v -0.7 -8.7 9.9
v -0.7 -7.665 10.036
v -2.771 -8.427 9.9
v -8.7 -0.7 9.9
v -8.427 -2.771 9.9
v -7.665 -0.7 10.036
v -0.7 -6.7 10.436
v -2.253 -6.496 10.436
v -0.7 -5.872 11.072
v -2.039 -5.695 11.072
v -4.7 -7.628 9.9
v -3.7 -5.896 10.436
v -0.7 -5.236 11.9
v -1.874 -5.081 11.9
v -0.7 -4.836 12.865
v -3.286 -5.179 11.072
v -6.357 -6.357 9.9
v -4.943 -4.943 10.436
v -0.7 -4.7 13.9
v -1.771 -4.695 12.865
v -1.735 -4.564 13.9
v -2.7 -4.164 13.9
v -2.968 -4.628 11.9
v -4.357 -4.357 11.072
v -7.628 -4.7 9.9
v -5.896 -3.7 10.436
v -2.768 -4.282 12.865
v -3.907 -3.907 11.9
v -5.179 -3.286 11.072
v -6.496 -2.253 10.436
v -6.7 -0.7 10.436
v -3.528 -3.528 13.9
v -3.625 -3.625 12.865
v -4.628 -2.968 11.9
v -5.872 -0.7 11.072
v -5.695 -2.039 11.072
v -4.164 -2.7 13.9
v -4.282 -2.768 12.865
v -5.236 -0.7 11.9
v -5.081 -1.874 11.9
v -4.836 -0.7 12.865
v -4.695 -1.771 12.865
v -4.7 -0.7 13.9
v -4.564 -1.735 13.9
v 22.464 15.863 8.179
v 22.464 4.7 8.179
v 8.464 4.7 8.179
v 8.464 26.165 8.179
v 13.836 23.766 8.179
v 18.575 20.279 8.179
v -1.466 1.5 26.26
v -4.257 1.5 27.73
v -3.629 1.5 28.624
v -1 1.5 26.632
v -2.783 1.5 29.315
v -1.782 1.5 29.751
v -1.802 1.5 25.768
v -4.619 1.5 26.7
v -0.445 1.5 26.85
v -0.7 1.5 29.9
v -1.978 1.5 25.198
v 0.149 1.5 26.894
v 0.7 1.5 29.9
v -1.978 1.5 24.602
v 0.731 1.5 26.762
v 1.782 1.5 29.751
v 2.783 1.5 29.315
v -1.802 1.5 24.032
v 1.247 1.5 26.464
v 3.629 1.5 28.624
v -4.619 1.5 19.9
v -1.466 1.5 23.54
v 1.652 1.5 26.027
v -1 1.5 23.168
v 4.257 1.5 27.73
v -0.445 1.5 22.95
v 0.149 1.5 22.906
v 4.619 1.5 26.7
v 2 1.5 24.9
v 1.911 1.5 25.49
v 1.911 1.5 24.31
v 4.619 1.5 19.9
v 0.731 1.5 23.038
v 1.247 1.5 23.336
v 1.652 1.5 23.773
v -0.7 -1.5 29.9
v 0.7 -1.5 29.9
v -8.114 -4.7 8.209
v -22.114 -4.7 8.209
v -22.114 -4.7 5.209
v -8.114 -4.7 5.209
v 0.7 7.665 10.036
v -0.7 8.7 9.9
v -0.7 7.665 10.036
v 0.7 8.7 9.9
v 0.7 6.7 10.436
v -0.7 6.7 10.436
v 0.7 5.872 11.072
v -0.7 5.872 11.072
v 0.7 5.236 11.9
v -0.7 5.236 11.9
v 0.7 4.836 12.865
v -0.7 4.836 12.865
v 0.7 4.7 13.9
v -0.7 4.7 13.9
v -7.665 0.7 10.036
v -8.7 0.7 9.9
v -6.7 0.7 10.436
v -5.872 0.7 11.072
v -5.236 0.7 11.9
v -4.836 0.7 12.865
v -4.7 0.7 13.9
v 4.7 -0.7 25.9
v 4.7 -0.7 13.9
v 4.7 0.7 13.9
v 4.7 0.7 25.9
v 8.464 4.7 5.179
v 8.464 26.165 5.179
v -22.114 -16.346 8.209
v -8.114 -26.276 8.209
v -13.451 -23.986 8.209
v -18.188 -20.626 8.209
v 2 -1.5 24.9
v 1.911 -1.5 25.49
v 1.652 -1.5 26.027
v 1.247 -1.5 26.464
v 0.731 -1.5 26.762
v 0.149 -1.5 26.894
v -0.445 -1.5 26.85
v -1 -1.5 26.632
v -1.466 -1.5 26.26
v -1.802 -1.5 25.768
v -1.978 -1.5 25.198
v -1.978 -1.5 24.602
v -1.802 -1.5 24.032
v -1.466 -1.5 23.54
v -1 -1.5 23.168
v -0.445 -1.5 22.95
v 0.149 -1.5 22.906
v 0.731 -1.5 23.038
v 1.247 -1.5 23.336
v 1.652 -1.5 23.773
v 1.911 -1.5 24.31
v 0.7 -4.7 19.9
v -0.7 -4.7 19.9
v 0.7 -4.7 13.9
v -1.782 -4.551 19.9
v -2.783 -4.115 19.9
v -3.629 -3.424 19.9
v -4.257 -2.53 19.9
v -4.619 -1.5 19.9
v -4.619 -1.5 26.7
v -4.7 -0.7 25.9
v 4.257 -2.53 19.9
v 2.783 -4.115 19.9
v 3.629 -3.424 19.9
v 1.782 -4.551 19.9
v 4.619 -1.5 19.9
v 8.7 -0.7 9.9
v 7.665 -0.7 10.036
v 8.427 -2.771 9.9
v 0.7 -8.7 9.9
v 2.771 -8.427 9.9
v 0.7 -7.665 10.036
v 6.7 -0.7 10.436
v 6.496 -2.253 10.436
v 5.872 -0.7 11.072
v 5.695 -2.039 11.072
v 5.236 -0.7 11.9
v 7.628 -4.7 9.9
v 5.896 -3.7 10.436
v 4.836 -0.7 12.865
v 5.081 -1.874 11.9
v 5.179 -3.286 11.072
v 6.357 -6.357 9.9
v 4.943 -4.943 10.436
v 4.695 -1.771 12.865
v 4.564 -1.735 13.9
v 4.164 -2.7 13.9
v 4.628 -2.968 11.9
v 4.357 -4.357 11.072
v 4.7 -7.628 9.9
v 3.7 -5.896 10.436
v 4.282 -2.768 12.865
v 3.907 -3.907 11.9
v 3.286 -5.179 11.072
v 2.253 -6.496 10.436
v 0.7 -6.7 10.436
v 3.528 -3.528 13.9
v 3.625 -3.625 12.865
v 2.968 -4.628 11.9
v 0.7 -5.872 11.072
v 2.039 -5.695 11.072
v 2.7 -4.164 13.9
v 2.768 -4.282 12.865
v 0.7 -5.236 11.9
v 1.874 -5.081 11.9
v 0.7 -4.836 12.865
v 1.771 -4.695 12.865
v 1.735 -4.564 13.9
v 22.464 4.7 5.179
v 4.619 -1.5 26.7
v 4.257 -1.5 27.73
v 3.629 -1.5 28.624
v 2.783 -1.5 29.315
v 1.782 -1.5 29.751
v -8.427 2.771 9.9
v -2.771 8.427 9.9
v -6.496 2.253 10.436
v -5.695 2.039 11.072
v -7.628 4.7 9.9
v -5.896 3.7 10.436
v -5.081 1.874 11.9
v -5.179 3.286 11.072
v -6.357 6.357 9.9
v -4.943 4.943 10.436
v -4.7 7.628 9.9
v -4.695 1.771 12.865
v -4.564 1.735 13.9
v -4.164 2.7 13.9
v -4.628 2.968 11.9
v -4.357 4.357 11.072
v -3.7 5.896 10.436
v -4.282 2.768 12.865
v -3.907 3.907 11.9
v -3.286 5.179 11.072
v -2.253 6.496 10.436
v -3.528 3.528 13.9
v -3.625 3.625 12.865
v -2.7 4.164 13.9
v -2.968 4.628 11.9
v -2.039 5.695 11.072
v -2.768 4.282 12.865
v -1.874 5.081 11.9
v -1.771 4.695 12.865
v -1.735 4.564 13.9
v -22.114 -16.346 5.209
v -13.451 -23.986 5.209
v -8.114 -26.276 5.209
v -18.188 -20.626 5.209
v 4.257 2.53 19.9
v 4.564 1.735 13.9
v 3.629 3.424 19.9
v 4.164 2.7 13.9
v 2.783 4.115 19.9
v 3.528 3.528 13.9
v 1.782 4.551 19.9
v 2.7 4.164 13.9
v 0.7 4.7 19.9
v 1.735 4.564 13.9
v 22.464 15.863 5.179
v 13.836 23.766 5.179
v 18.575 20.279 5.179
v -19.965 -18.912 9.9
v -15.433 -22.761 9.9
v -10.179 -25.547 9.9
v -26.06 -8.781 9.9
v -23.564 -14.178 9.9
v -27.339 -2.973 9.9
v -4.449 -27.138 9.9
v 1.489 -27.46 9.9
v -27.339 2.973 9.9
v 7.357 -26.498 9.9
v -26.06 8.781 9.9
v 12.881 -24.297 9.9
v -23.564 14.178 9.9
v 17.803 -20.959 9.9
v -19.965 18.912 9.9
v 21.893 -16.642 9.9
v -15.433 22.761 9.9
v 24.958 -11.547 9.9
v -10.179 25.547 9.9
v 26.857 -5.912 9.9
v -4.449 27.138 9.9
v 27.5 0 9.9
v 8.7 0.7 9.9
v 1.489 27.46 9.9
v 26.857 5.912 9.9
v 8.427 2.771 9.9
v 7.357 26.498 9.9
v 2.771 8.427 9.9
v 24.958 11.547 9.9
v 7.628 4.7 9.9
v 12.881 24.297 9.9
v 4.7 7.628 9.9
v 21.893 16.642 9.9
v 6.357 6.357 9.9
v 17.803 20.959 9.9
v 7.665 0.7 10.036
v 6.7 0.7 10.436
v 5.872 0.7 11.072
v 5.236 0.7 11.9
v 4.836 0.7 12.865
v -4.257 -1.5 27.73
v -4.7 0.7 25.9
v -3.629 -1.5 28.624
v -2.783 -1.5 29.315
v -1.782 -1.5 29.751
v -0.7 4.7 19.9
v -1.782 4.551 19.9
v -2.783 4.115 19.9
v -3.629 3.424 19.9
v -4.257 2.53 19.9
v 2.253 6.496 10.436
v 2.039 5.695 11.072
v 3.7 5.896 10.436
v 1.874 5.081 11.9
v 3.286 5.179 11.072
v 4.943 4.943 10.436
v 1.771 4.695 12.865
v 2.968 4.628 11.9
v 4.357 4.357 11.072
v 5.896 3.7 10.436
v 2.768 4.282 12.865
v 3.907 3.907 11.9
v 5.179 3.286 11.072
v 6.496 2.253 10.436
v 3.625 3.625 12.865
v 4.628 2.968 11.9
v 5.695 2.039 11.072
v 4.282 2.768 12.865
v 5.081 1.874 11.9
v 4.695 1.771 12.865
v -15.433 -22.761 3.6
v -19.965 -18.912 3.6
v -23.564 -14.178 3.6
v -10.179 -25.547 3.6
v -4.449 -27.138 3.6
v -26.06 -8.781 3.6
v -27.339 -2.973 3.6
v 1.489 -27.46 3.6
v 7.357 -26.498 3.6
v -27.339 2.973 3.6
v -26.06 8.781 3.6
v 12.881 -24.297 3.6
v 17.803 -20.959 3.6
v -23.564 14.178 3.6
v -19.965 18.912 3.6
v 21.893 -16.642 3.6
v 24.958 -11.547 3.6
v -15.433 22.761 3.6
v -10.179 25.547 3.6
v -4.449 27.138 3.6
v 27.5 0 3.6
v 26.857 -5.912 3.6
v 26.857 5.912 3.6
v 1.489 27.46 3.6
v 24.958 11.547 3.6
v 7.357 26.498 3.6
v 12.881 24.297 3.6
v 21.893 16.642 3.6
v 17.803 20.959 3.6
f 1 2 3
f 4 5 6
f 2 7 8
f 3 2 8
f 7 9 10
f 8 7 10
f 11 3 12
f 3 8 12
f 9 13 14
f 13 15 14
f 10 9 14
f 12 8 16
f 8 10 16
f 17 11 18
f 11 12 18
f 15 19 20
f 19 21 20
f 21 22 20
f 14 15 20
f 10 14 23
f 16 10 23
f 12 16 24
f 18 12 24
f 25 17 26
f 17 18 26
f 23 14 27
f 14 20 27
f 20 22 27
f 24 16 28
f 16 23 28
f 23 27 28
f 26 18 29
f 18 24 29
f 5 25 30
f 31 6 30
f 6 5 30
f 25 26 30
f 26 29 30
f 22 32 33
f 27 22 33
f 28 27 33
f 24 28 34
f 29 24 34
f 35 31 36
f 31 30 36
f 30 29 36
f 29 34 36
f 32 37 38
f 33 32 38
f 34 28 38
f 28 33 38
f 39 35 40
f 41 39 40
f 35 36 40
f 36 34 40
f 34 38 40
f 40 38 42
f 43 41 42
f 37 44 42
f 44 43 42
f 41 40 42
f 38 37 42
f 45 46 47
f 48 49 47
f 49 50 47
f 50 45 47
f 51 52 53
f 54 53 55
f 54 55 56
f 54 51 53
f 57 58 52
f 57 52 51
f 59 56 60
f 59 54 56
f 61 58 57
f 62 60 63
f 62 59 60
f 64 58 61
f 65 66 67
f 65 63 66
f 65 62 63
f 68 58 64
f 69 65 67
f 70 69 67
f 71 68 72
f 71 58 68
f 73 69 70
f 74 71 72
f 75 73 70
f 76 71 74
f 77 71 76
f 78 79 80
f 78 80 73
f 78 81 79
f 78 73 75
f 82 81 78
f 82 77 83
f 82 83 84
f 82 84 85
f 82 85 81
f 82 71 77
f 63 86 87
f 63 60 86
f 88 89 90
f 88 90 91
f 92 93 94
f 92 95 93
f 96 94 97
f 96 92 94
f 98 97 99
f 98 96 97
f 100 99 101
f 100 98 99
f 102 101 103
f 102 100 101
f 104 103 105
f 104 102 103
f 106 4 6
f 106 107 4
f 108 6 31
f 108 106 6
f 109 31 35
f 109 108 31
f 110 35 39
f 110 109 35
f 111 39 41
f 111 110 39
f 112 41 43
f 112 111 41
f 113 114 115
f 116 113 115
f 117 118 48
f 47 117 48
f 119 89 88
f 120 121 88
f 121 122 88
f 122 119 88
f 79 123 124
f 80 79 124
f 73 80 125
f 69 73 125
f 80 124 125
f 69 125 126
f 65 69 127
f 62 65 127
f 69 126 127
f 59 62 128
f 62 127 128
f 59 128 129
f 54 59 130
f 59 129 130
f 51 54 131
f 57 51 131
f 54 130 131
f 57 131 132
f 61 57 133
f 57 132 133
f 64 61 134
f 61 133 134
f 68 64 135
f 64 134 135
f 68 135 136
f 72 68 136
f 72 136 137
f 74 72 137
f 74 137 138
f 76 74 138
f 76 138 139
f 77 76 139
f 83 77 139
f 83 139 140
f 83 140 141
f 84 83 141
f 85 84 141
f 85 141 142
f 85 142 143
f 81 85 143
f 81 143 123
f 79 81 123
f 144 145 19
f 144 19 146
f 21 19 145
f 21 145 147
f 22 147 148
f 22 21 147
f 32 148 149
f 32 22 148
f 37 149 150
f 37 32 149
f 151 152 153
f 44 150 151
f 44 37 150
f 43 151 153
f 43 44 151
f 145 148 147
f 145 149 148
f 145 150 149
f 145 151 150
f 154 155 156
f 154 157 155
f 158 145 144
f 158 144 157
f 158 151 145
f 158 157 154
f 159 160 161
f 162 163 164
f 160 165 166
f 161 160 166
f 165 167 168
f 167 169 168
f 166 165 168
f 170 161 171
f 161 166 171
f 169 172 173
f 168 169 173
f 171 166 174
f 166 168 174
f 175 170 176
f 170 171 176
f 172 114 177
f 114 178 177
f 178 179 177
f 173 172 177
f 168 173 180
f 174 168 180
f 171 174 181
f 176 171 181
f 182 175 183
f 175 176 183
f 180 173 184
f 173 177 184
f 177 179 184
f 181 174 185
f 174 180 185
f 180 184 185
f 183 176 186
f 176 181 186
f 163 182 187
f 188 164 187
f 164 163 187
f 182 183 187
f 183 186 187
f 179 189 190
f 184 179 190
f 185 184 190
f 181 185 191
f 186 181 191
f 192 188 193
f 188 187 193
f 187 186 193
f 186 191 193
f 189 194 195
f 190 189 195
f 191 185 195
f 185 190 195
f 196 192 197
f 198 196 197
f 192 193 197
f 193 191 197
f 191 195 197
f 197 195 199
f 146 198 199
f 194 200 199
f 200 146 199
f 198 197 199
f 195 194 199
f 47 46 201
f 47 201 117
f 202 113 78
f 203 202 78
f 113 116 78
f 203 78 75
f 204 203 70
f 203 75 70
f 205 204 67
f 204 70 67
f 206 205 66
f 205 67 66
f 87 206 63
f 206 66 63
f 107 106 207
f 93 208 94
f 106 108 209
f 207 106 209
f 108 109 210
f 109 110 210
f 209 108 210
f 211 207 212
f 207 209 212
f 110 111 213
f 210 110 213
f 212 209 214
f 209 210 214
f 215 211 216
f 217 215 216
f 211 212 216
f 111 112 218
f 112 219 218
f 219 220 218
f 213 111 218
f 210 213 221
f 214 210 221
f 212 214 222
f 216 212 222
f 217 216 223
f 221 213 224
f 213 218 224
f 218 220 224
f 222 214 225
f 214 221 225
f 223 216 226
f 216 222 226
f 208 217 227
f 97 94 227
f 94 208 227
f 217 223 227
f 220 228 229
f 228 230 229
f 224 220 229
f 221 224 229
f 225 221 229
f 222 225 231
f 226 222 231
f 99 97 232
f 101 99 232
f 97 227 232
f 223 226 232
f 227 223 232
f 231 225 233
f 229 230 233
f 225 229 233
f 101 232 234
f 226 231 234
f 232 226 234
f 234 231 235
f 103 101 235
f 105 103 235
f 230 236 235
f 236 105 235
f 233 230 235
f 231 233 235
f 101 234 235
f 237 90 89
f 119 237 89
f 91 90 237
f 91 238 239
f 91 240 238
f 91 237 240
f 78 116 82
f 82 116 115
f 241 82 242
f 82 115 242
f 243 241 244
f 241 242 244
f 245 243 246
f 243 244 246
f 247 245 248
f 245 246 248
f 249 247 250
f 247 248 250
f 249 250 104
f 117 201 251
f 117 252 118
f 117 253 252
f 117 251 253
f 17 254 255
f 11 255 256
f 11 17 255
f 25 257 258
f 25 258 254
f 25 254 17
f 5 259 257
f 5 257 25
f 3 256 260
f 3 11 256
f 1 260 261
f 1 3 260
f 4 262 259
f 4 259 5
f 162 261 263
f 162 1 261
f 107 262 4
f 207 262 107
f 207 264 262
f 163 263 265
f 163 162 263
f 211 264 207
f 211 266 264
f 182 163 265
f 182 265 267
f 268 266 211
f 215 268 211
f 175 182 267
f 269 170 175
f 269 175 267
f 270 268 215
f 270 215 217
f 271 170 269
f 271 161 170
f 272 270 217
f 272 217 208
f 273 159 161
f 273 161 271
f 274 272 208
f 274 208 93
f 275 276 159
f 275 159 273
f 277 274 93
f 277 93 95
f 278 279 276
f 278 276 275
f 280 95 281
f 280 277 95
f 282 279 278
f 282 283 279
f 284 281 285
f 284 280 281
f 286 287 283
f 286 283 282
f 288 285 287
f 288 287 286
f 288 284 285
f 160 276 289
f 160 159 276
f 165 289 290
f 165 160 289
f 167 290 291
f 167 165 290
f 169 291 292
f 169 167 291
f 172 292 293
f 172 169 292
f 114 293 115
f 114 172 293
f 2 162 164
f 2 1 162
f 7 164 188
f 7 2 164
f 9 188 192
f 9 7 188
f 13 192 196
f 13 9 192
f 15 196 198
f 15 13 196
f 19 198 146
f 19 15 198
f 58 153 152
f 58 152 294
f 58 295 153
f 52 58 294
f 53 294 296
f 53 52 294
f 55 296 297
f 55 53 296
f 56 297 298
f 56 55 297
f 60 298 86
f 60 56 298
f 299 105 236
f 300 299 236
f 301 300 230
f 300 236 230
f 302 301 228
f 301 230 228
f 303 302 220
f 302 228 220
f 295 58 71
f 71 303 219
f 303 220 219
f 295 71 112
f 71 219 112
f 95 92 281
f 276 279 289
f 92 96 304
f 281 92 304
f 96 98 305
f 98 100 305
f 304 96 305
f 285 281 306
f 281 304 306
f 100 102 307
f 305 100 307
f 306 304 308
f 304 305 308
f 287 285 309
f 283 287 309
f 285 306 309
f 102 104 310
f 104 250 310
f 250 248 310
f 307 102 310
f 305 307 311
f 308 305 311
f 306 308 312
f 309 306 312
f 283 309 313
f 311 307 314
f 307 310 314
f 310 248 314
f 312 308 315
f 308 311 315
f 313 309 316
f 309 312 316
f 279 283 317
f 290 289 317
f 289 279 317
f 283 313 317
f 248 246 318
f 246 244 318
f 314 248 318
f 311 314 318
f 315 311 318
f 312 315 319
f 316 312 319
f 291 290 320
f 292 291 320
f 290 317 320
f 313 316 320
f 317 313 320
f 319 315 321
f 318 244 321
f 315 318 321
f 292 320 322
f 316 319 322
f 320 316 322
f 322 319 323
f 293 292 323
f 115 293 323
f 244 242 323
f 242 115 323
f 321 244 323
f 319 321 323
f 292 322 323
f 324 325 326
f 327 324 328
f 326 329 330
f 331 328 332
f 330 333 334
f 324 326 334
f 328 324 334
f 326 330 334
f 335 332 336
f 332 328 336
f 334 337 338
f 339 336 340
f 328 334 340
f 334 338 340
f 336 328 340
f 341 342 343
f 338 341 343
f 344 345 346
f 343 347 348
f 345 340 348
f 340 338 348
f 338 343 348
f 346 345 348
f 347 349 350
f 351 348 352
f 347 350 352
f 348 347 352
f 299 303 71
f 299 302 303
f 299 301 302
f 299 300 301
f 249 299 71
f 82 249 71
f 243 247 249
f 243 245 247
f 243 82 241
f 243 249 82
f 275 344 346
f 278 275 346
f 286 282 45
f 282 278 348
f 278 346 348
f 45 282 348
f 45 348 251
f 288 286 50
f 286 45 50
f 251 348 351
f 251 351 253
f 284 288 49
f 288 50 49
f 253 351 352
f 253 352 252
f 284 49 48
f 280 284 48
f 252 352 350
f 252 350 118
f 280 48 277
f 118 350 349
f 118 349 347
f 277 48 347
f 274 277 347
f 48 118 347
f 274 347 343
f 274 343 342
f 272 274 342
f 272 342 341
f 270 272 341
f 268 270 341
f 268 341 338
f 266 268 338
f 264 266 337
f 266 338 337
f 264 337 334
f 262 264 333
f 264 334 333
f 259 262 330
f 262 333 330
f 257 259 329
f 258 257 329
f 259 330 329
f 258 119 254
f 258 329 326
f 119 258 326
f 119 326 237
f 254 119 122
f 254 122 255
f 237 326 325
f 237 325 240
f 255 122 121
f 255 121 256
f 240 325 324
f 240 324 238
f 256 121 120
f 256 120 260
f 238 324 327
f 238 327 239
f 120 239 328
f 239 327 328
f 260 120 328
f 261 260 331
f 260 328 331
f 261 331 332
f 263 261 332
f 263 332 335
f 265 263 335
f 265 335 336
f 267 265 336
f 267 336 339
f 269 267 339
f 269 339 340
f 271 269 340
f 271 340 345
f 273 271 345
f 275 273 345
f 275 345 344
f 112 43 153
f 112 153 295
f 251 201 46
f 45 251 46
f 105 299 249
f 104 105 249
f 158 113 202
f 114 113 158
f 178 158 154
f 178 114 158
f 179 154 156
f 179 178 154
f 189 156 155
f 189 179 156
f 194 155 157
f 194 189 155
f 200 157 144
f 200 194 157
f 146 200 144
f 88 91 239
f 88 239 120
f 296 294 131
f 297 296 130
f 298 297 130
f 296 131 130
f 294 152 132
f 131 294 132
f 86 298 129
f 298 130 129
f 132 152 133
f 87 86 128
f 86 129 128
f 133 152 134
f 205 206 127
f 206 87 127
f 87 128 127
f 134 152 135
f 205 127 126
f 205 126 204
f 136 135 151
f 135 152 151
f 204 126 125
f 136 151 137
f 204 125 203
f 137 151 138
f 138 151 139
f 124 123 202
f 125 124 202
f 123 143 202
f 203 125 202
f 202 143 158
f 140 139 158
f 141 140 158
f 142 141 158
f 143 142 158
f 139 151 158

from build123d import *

# Parameters (mm, degrees)
F1_R         = 27.5
F2_DEPTH     = 6.3
F3_W         = 9.4
F3_H         = 9.4
F4_DEPTH     = 10
F5_W         = 9.4
F5_H         = 3
F6_DEPTH     = 10
F7_R         = 2
F8_DEPTH     = 25
F9_R         = 4
F10_T1_DEPTH = 20
F11_R        = 4
F12_W        = 14
F12_H        = 3
F13_DEPTH    = 25
F14_W        = 14
F14_H        = 3
F15_DEPTH    = 25


# Not quite as in the source:
# - a fillet or chamfer that OpenCascade refuses, or shapes differently, is made with other operations: its cross-section is extruded or revolved along the edge and cut away or added


with BuildPart() as f2:
    # F1 (on offset) → F2 (new body)
    with BuildSketch(Plane.XY.offset(3.6)):
        Circle(F1_R)
    extrude(amount=F2_DEPTH)

    # F3 (on face) → F4 (join)
    with BuildSketch(Plane.XY.offset(9.9)):
        Rectangle(F3_W, F3_H)
    extrude(amount=F4_DEPTH)

    # F5 (on face) → F6 (join)
    with BuildSketch(Plane.XY.offset(19.9)):
        Rectangle(F5_W, F5_H)
    extrude(amount=F6_DEPTH)

    # F7 (on face) → F8 (cut)
    with BuildSketch(Plane.XZ.offset(1.5)):
        with Locations((0, 24.9)):
            Circle(F7_R)
    extrude(amount=-F8_DEPTH, mode=Mode.SUBTRACT)

    # F9
    f9_edges = [f2.edges().sort_by_distance(p)[0] for p in [
        (-4.7, 0, 29.9),
        (4.7, 0, 29.9),
    ]]
    fillet(f9_edges, radius=F9_R)

    # F10: fillet of radius 4 on 4 edges, made by hand

    # F10_s2 → F10_t1 (cut)
    with BuildSketch(Plane.XY.offset(9.9)):
        with BuildLine():
            ThreePointArc((-0.7, -4.7), (-3.5284271247, -3.5284271247), (-4.7, -0.7))
            Line((-4.7, -0.7), (-4.7, -4.7))
            Line((-4.7, -4.7), (-0.7, -4.7))
        make_face()
        with BuildLine():
            ThreePointArc((-0.7, 4.7), (-3.5284271247, 3.5284271247), (-4.7, 0.7))
            Line((-4.7, 0.7), (-4.7, 4.7))
            Line((-4.7, 4.7), (-0.7, 4.7))
        make_face()
        with BuildLine():
            ThreePointArc((4.7, -0.7), (3.5284271247, -3.5284271247), (0.7, -4.7))
            Line((0.7, -4.7), (4.7, -4.7))
            Line((4.7, -4.7), (4.7, -0.7))
        make_face()
        with BuildLine():
            ThreePointArc((4.7, 0.7), (3.5284271247, 3.5284271247), (0.7, 4.7))
            Line((0.7, 4.7), (4.7, 4.7))
            Line((4.7, 4.7), (4.7, 0.7))
        make_face()
    extrude(amount=F10_T1_DEPTH, mode=Mode.SUBTRACT)

    # F11
    f11_edges = [f2.edges().sort_by_distance(p)[0] for p in [
        (-3.528427, -3.528427, 9.9),
    ]]
    fillet(f11_edges, radius=F11_R)

    # F12 (on face) → F13 (cut)
    with BuildSketch(Plane(origin=(0, 4.7, 0), x_dir=(-1, 0, 0), z_dir=(0, 1, 0))):
        with Locations((-15.4635200504, 6.6790340934)):
            Rectangle(F12_W, F12_H)
    extrude(amount=F13_DEPTH, mode=Mode.SUBTRACT)

    # F14 (on face) → F15 (cut)
    with BuildSketch(Plane.XZ.offset(4.7)):
        with Locations((-15.1143019667, 6.7091025412)):
            Rectangle(F14_W, F14_H)
    extrude(amount=F15_DEPTH, mode=Mode.SUBTRACT)


solid = f2.part
